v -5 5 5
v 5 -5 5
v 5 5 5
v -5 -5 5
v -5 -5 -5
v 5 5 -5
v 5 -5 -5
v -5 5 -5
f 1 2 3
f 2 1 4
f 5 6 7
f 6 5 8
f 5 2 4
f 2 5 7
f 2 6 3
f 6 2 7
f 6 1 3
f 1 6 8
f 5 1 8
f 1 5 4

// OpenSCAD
// cube_param.scad
// param: size=10
module param_cube(size=10) {
    cube([size, size, size], center=true);
}
param_cube(size=10);
